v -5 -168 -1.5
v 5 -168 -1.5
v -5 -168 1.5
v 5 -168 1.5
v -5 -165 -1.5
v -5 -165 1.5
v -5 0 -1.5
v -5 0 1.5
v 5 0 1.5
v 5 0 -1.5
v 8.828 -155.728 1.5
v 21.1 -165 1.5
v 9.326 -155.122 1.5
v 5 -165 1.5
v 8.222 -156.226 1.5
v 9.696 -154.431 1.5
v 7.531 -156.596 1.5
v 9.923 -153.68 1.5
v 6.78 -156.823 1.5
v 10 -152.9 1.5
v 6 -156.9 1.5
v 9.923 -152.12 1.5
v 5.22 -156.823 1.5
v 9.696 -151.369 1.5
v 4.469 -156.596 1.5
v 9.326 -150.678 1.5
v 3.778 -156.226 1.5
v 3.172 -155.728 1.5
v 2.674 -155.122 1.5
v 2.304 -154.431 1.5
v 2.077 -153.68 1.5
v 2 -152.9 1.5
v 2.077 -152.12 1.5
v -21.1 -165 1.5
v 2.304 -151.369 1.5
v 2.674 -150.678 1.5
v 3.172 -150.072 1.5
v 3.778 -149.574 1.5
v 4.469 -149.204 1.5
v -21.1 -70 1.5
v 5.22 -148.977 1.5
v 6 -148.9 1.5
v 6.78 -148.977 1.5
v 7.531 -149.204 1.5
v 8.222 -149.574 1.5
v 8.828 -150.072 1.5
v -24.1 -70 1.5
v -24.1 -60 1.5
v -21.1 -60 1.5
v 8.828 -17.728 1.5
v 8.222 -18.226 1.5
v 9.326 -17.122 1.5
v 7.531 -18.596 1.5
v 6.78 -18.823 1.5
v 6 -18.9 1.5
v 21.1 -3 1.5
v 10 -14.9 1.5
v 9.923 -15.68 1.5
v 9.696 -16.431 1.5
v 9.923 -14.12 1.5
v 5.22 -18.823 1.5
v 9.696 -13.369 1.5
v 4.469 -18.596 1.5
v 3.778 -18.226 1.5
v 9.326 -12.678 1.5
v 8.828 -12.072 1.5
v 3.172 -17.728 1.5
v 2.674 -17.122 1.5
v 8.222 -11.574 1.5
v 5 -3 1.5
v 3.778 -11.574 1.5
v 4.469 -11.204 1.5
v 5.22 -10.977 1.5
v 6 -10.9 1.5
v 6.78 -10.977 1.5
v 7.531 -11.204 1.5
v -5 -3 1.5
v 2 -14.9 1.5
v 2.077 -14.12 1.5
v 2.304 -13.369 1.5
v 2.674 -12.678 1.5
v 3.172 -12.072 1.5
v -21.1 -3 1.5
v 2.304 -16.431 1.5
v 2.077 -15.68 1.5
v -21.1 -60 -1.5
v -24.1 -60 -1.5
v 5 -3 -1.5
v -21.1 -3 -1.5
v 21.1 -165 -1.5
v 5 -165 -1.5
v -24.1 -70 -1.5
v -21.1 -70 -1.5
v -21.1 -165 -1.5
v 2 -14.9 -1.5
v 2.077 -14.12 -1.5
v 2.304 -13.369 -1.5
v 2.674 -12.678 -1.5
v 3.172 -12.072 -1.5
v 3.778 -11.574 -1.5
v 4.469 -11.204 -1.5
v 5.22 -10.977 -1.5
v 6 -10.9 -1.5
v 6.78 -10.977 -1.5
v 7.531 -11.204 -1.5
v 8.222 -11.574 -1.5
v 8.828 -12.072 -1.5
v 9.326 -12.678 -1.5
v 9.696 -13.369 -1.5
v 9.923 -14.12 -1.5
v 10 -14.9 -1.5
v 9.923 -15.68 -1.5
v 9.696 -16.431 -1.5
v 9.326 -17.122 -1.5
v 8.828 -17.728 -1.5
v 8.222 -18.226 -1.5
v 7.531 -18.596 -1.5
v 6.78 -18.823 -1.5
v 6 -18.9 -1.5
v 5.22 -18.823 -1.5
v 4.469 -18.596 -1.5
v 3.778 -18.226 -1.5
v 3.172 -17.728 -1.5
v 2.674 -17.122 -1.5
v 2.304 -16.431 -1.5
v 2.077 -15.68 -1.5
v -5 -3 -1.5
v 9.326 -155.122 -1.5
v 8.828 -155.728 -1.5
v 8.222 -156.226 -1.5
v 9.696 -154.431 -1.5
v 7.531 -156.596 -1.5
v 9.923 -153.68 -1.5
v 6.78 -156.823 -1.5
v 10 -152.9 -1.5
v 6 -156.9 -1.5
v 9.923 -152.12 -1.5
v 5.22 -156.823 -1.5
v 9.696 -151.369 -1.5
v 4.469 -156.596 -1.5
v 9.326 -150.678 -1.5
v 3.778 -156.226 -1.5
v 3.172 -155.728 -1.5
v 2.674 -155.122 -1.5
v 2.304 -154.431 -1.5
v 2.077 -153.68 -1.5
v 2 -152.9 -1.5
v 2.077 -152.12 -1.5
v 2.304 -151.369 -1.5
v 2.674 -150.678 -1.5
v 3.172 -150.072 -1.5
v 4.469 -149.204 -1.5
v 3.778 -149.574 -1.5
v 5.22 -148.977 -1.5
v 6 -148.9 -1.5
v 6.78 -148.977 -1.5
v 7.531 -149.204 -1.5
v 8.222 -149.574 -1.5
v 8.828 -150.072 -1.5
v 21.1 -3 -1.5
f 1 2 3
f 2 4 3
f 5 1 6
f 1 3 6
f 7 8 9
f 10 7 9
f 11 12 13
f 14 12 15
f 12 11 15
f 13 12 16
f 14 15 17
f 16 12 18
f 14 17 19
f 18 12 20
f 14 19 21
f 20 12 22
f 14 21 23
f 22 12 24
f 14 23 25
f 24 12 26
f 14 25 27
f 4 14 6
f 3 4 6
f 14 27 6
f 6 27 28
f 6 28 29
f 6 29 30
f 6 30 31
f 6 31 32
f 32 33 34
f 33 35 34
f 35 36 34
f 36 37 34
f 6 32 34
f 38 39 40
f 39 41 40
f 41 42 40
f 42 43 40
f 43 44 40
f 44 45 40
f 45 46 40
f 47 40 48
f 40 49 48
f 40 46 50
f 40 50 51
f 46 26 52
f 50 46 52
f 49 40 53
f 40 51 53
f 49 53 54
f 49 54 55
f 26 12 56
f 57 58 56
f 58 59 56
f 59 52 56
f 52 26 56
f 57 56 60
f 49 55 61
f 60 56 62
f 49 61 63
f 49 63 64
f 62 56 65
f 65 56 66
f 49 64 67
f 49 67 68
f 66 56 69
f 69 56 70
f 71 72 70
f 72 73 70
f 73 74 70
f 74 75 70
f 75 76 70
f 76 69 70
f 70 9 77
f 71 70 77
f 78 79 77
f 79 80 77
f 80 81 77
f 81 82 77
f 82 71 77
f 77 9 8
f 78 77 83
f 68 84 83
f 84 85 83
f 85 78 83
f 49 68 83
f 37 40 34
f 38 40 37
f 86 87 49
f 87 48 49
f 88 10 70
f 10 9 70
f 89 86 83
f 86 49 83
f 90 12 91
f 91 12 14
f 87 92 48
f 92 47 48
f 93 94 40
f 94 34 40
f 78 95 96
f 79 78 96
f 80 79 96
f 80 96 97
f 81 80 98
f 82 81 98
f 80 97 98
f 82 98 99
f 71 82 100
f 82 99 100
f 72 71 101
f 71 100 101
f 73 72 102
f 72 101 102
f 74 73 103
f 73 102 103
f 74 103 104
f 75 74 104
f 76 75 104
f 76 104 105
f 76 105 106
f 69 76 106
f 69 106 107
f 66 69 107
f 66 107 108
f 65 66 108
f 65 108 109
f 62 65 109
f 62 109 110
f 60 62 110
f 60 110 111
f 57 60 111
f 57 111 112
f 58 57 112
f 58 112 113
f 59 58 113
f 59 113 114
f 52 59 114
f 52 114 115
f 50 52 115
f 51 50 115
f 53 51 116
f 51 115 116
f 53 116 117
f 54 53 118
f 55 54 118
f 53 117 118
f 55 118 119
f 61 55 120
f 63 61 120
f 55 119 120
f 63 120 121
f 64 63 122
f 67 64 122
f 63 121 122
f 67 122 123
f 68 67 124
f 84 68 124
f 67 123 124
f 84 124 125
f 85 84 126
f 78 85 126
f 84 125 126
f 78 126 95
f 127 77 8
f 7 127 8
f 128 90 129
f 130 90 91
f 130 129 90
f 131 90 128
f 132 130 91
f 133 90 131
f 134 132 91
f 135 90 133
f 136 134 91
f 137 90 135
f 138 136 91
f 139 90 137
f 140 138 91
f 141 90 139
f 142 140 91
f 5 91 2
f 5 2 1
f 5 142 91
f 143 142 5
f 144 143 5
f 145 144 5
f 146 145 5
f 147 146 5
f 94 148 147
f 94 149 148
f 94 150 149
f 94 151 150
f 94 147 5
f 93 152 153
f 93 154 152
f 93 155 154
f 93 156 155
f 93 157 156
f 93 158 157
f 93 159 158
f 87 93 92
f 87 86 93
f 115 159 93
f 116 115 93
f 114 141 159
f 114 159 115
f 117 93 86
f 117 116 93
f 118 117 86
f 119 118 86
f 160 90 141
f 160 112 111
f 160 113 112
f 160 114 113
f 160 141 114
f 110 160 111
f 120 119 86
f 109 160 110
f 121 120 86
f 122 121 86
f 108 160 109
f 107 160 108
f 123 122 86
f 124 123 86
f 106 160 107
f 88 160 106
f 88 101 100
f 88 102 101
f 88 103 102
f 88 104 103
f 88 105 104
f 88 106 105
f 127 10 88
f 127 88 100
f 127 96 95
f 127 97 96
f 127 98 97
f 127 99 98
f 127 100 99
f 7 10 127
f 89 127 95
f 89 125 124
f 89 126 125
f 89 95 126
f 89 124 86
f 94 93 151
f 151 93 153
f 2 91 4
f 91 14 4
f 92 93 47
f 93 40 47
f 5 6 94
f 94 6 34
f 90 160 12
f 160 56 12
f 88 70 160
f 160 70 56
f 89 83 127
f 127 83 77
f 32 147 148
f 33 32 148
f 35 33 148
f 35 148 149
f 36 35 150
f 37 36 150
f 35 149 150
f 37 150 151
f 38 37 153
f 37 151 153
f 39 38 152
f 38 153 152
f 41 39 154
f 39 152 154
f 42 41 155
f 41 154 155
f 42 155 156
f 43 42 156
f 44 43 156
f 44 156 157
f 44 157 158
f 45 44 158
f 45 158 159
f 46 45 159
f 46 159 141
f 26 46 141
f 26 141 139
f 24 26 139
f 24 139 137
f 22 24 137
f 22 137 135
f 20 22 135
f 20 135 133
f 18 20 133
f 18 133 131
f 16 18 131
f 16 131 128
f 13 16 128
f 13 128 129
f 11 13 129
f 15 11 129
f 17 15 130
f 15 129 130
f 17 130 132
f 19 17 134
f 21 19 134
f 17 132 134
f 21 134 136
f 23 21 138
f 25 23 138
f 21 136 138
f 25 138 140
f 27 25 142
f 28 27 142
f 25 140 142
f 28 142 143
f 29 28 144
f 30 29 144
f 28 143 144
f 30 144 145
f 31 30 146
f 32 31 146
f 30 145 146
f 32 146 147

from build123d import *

# Parameters (mm, degrees)
BOSS_EXTRUDE1_DEPTH      = 1.5
F_8_0_8_DIAMETER_HOLE1_D = 8


with BuildPart() as part:
    # Sketch1 → Boss-Extrude1 (new, symmetric)
    with BuildSketch(Plane.XY):
        Polygon((-5, 0), (5, 0), (5, -3), (21.1, -3), (21.1, -165), (5, -165), (5, -168), (-5, -168), (-5, -165), (-21.1, -165), (-21.1, -70), (-24.1, -70), (-24.1, -60), (-21.1, -60), (-21.1, -3), (-5, -3), align=None)
    extrude(amount=BOSS_EXTRUDE1_DEPTH, both=True)

    # Ø8.0 (8) Diameter Hole1 (through all)
    with Locations(Plane.XY.offset(1.5)):
        with Locations((6, -14.9), (6, -152.9)):
            Hole(F_8_0_8_DIAMETER_HOLE1_D / 2)


solid = part.part
